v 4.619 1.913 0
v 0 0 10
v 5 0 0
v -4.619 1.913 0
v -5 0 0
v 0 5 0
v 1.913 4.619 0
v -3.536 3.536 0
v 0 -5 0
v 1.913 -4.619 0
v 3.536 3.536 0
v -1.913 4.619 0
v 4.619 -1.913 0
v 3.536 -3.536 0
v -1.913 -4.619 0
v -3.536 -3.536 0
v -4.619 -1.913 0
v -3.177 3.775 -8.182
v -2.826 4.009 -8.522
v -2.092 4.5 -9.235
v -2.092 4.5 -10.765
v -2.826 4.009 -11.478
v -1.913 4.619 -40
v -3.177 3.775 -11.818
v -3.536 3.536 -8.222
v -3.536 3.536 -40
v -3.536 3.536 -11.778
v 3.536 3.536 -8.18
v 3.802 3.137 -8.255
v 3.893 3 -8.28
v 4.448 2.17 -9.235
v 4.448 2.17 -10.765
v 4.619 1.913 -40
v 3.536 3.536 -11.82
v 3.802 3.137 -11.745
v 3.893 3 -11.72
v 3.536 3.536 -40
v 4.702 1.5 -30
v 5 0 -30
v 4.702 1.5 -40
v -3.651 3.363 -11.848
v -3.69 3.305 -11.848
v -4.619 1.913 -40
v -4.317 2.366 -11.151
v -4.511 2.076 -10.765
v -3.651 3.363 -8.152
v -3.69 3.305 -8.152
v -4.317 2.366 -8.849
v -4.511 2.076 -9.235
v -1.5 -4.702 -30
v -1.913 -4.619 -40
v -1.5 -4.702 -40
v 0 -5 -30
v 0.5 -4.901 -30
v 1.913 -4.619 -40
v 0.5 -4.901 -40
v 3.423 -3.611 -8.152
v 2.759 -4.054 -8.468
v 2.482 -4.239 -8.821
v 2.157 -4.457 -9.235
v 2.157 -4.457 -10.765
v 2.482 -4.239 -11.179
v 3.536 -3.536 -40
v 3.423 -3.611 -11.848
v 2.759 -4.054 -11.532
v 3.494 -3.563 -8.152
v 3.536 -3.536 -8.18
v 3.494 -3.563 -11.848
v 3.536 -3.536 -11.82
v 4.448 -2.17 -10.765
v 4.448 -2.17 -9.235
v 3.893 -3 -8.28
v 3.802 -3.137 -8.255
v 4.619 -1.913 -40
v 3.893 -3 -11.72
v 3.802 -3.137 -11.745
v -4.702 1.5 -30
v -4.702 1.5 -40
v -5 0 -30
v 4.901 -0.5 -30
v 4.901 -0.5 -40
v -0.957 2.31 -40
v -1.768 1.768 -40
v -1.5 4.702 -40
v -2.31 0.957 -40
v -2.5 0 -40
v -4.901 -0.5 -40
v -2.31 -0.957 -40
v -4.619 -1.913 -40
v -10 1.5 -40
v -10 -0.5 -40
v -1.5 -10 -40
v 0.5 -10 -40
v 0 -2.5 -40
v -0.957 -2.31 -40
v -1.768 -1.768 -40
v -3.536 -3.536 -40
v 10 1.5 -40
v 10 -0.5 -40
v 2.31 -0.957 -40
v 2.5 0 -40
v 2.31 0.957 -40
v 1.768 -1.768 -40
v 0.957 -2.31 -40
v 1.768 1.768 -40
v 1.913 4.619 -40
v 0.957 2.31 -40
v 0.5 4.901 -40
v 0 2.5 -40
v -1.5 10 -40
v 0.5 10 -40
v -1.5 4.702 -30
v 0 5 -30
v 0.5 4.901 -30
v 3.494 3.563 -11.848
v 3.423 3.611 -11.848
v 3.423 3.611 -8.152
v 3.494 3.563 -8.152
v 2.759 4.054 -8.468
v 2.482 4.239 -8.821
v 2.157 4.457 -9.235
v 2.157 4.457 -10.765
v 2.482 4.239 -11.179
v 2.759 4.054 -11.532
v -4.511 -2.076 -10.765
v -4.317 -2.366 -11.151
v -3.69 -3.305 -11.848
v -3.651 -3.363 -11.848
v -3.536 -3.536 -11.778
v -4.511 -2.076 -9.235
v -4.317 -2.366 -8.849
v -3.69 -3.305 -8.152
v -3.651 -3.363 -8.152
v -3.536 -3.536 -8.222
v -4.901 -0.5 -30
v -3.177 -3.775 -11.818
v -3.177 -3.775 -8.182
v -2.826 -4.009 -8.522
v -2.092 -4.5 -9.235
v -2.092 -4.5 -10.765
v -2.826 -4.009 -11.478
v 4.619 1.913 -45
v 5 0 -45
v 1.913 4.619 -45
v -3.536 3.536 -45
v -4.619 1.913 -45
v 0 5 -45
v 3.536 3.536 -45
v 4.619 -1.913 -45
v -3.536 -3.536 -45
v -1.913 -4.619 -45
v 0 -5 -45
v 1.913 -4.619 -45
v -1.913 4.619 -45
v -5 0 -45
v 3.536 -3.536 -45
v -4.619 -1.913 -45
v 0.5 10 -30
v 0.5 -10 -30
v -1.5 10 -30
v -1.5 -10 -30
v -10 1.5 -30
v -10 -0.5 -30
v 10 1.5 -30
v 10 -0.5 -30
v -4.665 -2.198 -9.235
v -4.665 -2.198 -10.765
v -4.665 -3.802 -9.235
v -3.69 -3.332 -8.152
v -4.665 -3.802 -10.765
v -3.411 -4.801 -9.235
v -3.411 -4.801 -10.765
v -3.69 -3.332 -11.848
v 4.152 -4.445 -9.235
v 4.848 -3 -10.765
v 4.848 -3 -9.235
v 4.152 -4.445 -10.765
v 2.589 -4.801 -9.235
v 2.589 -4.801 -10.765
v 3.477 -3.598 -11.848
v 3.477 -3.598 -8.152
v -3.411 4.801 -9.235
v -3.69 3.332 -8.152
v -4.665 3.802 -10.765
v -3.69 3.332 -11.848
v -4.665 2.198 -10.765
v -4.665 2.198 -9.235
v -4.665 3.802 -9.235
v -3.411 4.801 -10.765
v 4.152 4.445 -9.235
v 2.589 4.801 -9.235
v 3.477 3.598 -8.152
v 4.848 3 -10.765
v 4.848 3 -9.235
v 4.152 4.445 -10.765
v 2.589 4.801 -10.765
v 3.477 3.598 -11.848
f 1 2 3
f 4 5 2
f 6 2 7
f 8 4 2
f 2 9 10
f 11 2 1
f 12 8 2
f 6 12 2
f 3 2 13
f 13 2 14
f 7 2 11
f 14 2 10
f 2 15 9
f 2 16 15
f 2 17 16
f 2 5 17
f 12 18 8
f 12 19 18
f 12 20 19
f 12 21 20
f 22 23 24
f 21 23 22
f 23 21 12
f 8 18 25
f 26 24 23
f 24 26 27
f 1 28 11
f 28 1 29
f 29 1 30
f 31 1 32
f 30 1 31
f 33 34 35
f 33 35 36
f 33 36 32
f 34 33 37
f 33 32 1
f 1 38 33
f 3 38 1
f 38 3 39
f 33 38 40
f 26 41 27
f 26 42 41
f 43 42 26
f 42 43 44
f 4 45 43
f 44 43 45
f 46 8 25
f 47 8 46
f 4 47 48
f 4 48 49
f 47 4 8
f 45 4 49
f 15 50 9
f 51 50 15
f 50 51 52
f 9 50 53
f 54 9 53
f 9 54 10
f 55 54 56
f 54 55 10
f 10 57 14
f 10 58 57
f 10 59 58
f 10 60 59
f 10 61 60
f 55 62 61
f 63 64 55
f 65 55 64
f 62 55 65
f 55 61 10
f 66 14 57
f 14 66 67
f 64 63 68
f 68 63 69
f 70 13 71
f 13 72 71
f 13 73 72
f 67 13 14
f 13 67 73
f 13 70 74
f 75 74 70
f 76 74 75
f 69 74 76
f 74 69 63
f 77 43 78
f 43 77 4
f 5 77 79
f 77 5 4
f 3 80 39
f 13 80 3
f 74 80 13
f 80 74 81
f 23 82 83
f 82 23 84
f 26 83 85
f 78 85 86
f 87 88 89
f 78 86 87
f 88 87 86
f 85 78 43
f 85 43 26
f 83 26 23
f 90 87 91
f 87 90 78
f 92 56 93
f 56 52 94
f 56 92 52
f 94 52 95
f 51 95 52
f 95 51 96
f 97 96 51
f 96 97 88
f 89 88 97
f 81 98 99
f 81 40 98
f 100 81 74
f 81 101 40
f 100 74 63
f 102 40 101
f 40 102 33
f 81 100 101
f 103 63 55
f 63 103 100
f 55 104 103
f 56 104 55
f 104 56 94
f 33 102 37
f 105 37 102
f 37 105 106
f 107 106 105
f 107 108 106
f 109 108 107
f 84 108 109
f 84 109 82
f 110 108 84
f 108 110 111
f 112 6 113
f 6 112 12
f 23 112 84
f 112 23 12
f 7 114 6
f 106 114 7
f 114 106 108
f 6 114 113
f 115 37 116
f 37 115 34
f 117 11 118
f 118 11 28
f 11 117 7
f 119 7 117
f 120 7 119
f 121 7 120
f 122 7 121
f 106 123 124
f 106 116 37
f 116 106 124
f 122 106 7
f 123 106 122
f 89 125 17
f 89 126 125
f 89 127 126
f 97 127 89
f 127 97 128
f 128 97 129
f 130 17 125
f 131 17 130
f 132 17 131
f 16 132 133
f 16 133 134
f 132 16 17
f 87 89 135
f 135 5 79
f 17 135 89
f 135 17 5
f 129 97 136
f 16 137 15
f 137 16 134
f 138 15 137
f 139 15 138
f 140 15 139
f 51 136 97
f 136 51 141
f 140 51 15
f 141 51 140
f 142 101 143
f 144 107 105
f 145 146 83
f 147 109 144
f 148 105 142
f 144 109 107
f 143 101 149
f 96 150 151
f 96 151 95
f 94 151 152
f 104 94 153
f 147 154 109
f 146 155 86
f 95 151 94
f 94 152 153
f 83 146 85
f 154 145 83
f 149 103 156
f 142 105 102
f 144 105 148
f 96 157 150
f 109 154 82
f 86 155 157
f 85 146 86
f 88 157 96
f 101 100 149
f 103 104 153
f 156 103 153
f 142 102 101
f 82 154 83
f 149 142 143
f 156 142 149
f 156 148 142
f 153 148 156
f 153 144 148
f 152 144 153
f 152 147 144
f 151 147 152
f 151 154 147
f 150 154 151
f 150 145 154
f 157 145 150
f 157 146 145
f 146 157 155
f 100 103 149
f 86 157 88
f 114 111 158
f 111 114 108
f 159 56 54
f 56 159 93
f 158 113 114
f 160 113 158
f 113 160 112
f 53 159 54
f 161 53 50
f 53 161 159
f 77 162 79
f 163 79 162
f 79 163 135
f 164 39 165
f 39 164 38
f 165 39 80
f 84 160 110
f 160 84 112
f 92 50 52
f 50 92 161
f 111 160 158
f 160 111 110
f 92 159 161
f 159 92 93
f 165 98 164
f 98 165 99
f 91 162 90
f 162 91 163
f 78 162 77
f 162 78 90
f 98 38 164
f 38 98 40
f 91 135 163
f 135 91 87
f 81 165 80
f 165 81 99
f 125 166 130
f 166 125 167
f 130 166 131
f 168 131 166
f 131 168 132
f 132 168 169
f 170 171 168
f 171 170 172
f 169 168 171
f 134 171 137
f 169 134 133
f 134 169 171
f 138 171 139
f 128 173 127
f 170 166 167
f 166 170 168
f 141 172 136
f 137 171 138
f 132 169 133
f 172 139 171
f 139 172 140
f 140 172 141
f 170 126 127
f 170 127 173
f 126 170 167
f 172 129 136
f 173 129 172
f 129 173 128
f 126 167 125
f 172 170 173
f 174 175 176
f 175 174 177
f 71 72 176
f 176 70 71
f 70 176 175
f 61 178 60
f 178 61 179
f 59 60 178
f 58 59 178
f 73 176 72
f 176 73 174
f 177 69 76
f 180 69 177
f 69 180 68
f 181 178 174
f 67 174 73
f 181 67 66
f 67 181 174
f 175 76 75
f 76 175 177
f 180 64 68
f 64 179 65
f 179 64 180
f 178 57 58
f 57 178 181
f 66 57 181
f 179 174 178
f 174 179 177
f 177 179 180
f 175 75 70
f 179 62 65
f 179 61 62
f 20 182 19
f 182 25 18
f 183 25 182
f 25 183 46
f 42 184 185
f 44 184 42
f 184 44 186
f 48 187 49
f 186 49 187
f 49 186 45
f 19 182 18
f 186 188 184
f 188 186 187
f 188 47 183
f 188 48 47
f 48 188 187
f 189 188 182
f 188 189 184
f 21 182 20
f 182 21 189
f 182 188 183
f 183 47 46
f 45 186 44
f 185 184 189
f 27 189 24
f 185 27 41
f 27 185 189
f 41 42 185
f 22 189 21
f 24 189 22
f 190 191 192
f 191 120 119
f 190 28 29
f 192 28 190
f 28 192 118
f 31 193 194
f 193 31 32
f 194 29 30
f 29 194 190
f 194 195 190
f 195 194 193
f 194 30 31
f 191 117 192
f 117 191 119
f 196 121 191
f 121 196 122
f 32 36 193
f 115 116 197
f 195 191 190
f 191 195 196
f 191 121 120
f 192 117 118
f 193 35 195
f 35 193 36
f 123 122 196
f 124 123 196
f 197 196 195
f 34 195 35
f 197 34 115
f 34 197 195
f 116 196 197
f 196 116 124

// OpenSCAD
// nose
cylinder(h=10, r1=5, r2=0);

// body
translate([0,0,-40])
cylinder(h=40, r1=5, r2=5);

// nozzle
translate([0,0,-45])
cylinder(h=5, r1=5, r2=2.5);

// fins
translate([-1.5,-10,-40])
cube([2,20,10]);
translate([-10,-0.5,-40])
cube([20,2,10]);


// windows
translate([-3,-3, -10])
sphere(2);
translate([3,-3, -10])
sphere(2);
translate([-3,3, -10])
sphere(2);
translate([3,3, -10])
sphere(2);
